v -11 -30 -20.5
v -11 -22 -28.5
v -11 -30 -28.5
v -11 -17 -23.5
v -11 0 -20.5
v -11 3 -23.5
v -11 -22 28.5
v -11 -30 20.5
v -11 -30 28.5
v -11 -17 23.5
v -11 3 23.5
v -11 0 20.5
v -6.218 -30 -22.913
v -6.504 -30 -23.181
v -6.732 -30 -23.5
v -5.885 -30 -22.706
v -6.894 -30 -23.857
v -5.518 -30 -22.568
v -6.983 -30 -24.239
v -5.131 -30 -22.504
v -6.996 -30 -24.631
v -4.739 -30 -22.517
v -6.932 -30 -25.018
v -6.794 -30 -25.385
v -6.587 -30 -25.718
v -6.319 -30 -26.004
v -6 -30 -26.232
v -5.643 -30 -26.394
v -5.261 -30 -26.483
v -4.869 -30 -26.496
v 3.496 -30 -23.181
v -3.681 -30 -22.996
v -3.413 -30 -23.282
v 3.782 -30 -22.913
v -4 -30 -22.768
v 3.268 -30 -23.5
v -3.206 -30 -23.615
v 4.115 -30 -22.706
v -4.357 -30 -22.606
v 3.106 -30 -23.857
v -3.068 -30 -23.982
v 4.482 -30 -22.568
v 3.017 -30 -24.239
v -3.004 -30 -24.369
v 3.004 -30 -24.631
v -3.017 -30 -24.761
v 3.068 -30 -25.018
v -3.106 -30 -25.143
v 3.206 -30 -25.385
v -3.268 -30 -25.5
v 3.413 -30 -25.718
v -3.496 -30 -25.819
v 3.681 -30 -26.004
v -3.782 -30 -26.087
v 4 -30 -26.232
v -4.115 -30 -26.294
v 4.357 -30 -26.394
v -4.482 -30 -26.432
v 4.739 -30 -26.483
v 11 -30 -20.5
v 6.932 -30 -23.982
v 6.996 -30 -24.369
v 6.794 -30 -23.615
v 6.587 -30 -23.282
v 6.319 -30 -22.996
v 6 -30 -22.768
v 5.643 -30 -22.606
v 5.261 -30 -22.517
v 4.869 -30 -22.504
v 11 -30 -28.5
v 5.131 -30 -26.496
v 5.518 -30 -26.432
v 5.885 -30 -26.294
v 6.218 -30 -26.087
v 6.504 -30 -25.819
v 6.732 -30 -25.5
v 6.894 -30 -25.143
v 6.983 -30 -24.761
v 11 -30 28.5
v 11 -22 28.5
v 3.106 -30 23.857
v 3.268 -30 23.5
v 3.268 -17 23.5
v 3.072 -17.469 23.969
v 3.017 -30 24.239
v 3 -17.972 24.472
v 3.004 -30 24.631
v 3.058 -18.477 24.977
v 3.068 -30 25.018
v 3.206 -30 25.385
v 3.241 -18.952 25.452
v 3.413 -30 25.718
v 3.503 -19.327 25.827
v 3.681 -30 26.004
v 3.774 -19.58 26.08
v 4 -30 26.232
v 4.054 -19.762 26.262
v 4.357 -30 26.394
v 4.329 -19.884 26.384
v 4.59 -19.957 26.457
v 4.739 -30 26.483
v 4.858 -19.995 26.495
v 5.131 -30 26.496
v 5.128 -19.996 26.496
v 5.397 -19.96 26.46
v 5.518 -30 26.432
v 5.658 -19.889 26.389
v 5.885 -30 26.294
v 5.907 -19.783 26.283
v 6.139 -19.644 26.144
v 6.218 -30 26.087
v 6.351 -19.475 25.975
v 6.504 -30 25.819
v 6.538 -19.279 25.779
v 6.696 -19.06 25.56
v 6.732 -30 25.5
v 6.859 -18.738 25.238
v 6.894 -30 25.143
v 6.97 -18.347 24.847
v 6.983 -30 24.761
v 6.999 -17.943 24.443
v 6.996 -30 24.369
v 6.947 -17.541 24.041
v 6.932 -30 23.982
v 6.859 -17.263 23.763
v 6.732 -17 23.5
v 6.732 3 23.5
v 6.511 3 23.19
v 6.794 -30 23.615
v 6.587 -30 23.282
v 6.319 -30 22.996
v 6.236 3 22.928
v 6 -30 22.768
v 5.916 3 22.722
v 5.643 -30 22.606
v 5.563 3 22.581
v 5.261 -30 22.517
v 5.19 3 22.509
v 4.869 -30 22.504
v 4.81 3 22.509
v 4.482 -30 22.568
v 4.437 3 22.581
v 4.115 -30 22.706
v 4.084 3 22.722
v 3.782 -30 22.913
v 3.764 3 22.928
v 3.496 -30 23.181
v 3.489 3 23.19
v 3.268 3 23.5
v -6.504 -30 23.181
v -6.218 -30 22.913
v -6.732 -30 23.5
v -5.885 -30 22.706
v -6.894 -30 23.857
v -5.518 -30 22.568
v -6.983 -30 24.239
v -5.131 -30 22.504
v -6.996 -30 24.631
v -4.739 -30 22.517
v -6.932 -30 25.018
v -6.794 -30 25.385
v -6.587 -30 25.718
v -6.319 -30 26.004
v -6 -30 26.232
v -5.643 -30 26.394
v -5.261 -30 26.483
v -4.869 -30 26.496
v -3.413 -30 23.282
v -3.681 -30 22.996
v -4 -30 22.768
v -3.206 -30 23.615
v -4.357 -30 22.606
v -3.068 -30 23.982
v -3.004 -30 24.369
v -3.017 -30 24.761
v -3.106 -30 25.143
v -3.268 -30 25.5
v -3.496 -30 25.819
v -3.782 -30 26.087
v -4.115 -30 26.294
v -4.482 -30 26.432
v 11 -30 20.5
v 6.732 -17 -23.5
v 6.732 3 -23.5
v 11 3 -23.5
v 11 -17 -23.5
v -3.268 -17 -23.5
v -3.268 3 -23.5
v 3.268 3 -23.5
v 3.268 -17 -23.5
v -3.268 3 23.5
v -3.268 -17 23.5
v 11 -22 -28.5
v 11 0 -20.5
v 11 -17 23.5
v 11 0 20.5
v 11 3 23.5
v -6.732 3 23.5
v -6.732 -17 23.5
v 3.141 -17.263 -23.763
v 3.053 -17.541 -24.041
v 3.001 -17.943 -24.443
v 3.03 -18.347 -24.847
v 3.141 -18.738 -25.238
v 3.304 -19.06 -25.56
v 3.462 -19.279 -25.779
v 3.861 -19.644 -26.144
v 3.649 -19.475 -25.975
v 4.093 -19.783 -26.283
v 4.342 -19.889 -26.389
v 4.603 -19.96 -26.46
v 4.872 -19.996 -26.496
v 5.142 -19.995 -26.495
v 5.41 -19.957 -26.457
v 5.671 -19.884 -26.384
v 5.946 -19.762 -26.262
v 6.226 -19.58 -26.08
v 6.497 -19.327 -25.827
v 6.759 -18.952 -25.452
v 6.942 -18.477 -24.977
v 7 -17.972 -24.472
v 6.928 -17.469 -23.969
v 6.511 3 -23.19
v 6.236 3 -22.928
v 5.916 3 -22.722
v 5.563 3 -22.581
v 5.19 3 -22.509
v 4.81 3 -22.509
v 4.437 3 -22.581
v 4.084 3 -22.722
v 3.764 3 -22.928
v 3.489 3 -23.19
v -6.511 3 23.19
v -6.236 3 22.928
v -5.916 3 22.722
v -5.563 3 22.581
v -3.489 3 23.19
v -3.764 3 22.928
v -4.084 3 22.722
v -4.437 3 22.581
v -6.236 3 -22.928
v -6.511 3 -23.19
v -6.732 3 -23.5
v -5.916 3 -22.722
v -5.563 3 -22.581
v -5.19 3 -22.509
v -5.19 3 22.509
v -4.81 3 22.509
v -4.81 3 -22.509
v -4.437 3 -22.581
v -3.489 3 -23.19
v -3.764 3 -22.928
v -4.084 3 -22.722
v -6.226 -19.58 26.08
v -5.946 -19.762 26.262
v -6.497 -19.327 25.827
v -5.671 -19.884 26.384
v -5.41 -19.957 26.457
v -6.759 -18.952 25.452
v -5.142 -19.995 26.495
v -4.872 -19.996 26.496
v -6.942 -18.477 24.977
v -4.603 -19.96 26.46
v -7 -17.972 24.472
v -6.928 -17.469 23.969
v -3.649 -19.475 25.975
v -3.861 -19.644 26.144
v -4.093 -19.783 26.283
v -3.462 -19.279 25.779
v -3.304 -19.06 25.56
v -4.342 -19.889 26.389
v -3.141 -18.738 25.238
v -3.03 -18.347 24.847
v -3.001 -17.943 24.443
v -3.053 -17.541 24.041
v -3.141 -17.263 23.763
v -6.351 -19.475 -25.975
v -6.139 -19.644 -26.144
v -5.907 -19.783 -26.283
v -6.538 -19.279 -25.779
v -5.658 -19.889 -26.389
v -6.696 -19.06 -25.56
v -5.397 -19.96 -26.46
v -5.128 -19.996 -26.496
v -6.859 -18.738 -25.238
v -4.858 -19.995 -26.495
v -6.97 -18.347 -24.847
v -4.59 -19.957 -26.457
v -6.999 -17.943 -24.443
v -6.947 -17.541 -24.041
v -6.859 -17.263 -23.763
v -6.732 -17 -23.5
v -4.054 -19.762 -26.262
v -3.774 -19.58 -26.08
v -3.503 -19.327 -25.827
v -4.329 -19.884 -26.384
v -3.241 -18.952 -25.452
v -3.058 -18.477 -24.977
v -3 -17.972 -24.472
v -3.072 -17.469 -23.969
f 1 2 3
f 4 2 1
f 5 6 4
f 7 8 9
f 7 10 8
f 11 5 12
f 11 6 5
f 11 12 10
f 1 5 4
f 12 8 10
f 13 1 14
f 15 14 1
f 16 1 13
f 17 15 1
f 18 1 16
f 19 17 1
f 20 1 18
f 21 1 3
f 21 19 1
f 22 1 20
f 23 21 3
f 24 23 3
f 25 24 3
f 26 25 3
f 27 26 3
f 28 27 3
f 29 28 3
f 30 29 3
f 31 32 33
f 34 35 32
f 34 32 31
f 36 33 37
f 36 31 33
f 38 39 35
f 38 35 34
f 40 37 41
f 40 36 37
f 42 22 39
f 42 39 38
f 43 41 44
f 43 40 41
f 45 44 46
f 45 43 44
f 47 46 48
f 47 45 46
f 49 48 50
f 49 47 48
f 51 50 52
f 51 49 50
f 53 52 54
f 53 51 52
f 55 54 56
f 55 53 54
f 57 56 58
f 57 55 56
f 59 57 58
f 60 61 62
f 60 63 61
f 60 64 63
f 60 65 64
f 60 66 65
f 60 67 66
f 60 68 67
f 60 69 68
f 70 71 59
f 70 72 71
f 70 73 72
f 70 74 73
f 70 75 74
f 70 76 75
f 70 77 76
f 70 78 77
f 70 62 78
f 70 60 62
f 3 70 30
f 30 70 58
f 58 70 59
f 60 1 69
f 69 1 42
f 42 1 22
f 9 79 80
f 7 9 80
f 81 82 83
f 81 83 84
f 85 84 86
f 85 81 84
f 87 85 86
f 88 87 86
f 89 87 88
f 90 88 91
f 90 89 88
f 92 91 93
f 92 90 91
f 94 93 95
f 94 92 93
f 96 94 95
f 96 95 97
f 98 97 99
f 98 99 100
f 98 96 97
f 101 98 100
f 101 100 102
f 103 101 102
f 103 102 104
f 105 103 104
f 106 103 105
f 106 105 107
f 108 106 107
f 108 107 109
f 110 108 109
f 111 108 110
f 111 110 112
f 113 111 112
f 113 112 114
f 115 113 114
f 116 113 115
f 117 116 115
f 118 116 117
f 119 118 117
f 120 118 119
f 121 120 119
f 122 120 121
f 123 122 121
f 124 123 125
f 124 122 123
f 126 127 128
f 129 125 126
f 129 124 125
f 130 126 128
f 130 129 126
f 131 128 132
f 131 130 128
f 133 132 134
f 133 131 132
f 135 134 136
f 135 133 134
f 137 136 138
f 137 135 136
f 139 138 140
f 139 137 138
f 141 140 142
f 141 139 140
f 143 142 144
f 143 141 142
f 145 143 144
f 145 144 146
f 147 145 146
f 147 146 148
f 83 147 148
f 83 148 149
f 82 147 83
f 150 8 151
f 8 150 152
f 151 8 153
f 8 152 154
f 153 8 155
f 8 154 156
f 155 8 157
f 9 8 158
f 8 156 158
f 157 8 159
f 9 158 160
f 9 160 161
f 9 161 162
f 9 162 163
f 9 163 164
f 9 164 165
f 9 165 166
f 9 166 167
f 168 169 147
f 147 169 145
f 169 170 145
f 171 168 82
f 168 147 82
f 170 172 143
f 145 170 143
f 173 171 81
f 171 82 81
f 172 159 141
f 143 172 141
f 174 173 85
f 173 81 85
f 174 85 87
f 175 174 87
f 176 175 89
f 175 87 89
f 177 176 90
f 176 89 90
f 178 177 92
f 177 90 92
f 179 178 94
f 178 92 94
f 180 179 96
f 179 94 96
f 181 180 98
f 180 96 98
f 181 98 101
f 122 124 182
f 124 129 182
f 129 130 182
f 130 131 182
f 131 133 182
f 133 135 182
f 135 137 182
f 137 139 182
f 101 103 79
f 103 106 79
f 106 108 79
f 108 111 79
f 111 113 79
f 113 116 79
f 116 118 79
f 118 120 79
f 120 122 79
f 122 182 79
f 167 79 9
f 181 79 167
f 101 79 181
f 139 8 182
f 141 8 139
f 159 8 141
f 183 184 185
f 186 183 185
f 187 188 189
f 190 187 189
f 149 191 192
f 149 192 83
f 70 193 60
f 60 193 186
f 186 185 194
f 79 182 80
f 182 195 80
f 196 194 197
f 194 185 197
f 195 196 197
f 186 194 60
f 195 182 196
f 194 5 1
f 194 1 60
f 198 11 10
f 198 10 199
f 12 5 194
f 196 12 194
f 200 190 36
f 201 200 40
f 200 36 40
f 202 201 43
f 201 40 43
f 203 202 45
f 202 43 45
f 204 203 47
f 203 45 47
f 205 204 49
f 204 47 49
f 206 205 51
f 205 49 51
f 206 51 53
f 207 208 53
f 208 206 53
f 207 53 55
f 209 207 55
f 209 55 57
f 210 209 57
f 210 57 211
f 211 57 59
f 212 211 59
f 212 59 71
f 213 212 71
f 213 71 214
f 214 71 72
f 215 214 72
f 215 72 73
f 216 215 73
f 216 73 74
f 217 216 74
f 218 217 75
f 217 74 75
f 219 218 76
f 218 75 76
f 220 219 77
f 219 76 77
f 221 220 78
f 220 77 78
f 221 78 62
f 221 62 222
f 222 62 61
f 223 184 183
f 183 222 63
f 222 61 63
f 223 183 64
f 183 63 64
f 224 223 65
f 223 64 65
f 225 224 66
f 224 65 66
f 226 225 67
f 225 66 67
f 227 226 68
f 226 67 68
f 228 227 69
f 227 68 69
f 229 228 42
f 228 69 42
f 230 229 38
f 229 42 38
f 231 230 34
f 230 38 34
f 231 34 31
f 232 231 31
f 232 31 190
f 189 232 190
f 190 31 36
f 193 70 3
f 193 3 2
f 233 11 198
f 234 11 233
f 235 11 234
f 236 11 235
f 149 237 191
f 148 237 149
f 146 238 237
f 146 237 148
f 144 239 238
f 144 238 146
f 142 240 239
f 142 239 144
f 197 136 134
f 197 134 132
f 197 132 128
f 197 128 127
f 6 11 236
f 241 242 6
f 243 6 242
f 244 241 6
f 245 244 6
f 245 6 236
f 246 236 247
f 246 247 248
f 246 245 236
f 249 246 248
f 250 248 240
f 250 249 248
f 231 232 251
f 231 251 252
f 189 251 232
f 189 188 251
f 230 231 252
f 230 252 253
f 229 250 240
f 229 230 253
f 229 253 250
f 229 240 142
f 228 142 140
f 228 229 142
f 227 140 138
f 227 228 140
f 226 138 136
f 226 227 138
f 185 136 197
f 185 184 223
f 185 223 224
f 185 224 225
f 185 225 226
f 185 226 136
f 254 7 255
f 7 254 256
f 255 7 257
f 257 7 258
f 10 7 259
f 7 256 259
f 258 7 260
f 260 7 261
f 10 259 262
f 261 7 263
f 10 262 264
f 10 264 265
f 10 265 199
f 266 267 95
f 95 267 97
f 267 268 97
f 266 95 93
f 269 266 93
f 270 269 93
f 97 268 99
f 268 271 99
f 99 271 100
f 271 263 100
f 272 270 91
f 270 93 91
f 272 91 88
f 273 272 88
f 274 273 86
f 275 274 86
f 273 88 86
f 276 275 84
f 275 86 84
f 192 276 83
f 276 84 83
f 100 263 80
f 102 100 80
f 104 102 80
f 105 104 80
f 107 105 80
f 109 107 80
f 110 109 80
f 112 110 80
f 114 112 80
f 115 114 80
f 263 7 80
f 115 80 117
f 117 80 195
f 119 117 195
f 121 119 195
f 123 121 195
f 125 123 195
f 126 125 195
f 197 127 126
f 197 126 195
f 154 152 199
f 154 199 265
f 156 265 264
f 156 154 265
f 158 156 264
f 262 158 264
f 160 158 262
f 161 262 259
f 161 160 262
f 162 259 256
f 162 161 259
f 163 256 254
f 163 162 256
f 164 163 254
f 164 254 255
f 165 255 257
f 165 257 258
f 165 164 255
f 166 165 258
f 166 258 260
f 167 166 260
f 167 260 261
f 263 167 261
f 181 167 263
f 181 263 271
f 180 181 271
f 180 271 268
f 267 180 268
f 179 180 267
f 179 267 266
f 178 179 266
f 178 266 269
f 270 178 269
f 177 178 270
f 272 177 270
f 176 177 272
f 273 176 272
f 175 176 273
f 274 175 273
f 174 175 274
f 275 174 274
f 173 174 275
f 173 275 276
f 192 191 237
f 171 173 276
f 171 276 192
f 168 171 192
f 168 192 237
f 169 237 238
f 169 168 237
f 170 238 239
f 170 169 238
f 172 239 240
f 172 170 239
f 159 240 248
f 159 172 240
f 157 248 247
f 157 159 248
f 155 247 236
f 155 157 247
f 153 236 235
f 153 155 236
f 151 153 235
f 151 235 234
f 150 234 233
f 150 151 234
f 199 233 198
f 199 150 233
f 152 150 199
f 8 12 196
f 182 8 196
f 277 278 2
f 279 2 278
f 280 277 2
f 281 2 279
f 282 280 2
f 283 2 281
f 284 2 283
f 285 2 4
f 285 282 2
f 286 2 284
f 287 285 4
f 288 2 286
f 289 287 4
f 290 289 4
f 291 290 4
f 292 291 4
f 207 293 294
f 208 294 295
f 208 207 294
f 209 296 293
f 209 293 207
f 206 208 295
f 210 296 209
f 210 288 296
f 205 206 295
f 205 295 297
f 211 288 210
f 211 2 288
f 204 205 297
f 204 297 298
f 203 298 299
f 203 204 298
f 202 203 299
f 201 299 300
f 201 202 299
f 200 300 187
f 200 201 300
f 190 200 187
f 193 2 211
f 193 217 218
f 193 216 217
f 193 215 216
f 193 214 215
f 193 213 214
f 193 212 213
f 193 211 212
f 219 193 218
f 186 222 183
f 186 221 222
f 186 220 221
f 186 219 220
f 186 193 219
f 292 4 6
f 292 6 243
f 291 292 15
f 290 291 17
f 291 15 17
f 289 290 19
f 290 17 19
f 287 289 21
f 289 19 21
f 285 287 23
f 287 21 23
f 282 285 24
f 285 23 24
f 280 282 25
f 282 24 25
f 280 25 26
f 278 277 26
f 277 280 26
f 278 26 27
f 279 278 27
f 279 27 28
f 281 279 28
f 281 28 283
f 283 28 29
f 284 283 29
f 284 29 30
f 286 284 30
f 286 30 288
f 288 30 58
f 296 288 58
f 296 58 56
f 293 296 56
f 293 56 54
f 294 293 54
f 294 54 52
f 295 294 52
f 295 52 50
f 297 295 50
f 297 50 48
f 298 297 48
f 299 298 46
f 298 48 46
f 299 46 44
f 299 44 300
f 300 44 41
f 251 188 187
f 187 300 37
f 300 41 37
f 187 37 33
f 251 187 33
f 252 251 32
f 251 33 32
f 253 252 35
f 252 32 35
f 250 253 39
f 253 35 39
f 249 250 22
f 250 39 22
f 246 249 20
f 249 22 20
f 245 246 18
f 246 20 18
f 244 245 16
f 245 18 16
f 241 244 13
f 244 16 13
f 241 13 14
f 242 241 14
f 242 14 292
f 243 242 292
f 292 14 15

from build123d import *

# Parameters (mm, degrees)
CROQUIS1_W              = 22
CROQUIS1_H              = 47
SALIENTE_EXTRUIR1_DEPTH = 3
CROQUIS2_W              = 22
CROQUIS2_H              = 3
SALIENTE_EXTRUIR2_DEPTH = 30
SALIENTE_EXTRUIR3_DEPTH = 11
CROQUIS5_R              = 2
CORTAR_EXTRUIR1_DEPTH   = 45.969434064


with BuildPart() as part:
    # Croquis1 → Saliente-Extruir1 (new body)
    with BuildSketch(Plane(origin=(0, 0, 0), x_dir=(1, 0, 0), z_dir=(0, 1, 0))):
        Rectangle(CROQUIS1_W, CROQUIS1_H)
    extrude(amount=SALIENTE_EXTRUIR1_DEPTH)

    # Croquis2 → Saliente-Extruir2 (add)
    with BuildSketch(Plane.XZ):
        with Locations((0, 22)):
            Rectangle(CROQUIS2_W, CROQUIS2_H)
        with Locations((0, -22)):
            Rectangle(CROQUIS2_W, CROQUIS2_H)
    extrude(amount=SALIENTE_EXTRUIR2_DEPTH)

    # Croquis4 → Saliente-Extruir3 (add, symmetric)
    with BuildSketch(Plane(origin=(0, 0, 0), x_dir=(0, 0, -1), z_dir=(1, 0, 0))):
        Polygon((23.5, -30), (28.5, -30), (28.5, -22), (23.5, -17), align=None)
    saliente_extruir3 = extrude(amount=SALIENTE_EXTRUIR3_DEPTH, both=True)

    # Croquis5 → Cortar-Extruir1 (cut, symmetric)
    with BuildSketch(Plane.XZ.offset(30)):
        with Locations(Location((5, -24.5, 0), (0, 0, 150))):
            Circle(CROQUIS5_R)
        with Locations(Location((-5, -24.5, 0), (0, 0, 150))):
            Circle(CROQUIS5_R)
    cortar_extruir1 = extrude(amount=CORTAR_EXTRUIR1_DEPTH, both=True, mode=Mode.SUBTRACT)

    # Simetría1: Saliente-Extruir3, Cortar-Extruir1 across plane
    add(saliente_extruir3.mirror(Plane.XY))
    add(cortar_extruir1.mirror(Plane.XY), mode=Mode.SUBTRACT)


solid = part.part
